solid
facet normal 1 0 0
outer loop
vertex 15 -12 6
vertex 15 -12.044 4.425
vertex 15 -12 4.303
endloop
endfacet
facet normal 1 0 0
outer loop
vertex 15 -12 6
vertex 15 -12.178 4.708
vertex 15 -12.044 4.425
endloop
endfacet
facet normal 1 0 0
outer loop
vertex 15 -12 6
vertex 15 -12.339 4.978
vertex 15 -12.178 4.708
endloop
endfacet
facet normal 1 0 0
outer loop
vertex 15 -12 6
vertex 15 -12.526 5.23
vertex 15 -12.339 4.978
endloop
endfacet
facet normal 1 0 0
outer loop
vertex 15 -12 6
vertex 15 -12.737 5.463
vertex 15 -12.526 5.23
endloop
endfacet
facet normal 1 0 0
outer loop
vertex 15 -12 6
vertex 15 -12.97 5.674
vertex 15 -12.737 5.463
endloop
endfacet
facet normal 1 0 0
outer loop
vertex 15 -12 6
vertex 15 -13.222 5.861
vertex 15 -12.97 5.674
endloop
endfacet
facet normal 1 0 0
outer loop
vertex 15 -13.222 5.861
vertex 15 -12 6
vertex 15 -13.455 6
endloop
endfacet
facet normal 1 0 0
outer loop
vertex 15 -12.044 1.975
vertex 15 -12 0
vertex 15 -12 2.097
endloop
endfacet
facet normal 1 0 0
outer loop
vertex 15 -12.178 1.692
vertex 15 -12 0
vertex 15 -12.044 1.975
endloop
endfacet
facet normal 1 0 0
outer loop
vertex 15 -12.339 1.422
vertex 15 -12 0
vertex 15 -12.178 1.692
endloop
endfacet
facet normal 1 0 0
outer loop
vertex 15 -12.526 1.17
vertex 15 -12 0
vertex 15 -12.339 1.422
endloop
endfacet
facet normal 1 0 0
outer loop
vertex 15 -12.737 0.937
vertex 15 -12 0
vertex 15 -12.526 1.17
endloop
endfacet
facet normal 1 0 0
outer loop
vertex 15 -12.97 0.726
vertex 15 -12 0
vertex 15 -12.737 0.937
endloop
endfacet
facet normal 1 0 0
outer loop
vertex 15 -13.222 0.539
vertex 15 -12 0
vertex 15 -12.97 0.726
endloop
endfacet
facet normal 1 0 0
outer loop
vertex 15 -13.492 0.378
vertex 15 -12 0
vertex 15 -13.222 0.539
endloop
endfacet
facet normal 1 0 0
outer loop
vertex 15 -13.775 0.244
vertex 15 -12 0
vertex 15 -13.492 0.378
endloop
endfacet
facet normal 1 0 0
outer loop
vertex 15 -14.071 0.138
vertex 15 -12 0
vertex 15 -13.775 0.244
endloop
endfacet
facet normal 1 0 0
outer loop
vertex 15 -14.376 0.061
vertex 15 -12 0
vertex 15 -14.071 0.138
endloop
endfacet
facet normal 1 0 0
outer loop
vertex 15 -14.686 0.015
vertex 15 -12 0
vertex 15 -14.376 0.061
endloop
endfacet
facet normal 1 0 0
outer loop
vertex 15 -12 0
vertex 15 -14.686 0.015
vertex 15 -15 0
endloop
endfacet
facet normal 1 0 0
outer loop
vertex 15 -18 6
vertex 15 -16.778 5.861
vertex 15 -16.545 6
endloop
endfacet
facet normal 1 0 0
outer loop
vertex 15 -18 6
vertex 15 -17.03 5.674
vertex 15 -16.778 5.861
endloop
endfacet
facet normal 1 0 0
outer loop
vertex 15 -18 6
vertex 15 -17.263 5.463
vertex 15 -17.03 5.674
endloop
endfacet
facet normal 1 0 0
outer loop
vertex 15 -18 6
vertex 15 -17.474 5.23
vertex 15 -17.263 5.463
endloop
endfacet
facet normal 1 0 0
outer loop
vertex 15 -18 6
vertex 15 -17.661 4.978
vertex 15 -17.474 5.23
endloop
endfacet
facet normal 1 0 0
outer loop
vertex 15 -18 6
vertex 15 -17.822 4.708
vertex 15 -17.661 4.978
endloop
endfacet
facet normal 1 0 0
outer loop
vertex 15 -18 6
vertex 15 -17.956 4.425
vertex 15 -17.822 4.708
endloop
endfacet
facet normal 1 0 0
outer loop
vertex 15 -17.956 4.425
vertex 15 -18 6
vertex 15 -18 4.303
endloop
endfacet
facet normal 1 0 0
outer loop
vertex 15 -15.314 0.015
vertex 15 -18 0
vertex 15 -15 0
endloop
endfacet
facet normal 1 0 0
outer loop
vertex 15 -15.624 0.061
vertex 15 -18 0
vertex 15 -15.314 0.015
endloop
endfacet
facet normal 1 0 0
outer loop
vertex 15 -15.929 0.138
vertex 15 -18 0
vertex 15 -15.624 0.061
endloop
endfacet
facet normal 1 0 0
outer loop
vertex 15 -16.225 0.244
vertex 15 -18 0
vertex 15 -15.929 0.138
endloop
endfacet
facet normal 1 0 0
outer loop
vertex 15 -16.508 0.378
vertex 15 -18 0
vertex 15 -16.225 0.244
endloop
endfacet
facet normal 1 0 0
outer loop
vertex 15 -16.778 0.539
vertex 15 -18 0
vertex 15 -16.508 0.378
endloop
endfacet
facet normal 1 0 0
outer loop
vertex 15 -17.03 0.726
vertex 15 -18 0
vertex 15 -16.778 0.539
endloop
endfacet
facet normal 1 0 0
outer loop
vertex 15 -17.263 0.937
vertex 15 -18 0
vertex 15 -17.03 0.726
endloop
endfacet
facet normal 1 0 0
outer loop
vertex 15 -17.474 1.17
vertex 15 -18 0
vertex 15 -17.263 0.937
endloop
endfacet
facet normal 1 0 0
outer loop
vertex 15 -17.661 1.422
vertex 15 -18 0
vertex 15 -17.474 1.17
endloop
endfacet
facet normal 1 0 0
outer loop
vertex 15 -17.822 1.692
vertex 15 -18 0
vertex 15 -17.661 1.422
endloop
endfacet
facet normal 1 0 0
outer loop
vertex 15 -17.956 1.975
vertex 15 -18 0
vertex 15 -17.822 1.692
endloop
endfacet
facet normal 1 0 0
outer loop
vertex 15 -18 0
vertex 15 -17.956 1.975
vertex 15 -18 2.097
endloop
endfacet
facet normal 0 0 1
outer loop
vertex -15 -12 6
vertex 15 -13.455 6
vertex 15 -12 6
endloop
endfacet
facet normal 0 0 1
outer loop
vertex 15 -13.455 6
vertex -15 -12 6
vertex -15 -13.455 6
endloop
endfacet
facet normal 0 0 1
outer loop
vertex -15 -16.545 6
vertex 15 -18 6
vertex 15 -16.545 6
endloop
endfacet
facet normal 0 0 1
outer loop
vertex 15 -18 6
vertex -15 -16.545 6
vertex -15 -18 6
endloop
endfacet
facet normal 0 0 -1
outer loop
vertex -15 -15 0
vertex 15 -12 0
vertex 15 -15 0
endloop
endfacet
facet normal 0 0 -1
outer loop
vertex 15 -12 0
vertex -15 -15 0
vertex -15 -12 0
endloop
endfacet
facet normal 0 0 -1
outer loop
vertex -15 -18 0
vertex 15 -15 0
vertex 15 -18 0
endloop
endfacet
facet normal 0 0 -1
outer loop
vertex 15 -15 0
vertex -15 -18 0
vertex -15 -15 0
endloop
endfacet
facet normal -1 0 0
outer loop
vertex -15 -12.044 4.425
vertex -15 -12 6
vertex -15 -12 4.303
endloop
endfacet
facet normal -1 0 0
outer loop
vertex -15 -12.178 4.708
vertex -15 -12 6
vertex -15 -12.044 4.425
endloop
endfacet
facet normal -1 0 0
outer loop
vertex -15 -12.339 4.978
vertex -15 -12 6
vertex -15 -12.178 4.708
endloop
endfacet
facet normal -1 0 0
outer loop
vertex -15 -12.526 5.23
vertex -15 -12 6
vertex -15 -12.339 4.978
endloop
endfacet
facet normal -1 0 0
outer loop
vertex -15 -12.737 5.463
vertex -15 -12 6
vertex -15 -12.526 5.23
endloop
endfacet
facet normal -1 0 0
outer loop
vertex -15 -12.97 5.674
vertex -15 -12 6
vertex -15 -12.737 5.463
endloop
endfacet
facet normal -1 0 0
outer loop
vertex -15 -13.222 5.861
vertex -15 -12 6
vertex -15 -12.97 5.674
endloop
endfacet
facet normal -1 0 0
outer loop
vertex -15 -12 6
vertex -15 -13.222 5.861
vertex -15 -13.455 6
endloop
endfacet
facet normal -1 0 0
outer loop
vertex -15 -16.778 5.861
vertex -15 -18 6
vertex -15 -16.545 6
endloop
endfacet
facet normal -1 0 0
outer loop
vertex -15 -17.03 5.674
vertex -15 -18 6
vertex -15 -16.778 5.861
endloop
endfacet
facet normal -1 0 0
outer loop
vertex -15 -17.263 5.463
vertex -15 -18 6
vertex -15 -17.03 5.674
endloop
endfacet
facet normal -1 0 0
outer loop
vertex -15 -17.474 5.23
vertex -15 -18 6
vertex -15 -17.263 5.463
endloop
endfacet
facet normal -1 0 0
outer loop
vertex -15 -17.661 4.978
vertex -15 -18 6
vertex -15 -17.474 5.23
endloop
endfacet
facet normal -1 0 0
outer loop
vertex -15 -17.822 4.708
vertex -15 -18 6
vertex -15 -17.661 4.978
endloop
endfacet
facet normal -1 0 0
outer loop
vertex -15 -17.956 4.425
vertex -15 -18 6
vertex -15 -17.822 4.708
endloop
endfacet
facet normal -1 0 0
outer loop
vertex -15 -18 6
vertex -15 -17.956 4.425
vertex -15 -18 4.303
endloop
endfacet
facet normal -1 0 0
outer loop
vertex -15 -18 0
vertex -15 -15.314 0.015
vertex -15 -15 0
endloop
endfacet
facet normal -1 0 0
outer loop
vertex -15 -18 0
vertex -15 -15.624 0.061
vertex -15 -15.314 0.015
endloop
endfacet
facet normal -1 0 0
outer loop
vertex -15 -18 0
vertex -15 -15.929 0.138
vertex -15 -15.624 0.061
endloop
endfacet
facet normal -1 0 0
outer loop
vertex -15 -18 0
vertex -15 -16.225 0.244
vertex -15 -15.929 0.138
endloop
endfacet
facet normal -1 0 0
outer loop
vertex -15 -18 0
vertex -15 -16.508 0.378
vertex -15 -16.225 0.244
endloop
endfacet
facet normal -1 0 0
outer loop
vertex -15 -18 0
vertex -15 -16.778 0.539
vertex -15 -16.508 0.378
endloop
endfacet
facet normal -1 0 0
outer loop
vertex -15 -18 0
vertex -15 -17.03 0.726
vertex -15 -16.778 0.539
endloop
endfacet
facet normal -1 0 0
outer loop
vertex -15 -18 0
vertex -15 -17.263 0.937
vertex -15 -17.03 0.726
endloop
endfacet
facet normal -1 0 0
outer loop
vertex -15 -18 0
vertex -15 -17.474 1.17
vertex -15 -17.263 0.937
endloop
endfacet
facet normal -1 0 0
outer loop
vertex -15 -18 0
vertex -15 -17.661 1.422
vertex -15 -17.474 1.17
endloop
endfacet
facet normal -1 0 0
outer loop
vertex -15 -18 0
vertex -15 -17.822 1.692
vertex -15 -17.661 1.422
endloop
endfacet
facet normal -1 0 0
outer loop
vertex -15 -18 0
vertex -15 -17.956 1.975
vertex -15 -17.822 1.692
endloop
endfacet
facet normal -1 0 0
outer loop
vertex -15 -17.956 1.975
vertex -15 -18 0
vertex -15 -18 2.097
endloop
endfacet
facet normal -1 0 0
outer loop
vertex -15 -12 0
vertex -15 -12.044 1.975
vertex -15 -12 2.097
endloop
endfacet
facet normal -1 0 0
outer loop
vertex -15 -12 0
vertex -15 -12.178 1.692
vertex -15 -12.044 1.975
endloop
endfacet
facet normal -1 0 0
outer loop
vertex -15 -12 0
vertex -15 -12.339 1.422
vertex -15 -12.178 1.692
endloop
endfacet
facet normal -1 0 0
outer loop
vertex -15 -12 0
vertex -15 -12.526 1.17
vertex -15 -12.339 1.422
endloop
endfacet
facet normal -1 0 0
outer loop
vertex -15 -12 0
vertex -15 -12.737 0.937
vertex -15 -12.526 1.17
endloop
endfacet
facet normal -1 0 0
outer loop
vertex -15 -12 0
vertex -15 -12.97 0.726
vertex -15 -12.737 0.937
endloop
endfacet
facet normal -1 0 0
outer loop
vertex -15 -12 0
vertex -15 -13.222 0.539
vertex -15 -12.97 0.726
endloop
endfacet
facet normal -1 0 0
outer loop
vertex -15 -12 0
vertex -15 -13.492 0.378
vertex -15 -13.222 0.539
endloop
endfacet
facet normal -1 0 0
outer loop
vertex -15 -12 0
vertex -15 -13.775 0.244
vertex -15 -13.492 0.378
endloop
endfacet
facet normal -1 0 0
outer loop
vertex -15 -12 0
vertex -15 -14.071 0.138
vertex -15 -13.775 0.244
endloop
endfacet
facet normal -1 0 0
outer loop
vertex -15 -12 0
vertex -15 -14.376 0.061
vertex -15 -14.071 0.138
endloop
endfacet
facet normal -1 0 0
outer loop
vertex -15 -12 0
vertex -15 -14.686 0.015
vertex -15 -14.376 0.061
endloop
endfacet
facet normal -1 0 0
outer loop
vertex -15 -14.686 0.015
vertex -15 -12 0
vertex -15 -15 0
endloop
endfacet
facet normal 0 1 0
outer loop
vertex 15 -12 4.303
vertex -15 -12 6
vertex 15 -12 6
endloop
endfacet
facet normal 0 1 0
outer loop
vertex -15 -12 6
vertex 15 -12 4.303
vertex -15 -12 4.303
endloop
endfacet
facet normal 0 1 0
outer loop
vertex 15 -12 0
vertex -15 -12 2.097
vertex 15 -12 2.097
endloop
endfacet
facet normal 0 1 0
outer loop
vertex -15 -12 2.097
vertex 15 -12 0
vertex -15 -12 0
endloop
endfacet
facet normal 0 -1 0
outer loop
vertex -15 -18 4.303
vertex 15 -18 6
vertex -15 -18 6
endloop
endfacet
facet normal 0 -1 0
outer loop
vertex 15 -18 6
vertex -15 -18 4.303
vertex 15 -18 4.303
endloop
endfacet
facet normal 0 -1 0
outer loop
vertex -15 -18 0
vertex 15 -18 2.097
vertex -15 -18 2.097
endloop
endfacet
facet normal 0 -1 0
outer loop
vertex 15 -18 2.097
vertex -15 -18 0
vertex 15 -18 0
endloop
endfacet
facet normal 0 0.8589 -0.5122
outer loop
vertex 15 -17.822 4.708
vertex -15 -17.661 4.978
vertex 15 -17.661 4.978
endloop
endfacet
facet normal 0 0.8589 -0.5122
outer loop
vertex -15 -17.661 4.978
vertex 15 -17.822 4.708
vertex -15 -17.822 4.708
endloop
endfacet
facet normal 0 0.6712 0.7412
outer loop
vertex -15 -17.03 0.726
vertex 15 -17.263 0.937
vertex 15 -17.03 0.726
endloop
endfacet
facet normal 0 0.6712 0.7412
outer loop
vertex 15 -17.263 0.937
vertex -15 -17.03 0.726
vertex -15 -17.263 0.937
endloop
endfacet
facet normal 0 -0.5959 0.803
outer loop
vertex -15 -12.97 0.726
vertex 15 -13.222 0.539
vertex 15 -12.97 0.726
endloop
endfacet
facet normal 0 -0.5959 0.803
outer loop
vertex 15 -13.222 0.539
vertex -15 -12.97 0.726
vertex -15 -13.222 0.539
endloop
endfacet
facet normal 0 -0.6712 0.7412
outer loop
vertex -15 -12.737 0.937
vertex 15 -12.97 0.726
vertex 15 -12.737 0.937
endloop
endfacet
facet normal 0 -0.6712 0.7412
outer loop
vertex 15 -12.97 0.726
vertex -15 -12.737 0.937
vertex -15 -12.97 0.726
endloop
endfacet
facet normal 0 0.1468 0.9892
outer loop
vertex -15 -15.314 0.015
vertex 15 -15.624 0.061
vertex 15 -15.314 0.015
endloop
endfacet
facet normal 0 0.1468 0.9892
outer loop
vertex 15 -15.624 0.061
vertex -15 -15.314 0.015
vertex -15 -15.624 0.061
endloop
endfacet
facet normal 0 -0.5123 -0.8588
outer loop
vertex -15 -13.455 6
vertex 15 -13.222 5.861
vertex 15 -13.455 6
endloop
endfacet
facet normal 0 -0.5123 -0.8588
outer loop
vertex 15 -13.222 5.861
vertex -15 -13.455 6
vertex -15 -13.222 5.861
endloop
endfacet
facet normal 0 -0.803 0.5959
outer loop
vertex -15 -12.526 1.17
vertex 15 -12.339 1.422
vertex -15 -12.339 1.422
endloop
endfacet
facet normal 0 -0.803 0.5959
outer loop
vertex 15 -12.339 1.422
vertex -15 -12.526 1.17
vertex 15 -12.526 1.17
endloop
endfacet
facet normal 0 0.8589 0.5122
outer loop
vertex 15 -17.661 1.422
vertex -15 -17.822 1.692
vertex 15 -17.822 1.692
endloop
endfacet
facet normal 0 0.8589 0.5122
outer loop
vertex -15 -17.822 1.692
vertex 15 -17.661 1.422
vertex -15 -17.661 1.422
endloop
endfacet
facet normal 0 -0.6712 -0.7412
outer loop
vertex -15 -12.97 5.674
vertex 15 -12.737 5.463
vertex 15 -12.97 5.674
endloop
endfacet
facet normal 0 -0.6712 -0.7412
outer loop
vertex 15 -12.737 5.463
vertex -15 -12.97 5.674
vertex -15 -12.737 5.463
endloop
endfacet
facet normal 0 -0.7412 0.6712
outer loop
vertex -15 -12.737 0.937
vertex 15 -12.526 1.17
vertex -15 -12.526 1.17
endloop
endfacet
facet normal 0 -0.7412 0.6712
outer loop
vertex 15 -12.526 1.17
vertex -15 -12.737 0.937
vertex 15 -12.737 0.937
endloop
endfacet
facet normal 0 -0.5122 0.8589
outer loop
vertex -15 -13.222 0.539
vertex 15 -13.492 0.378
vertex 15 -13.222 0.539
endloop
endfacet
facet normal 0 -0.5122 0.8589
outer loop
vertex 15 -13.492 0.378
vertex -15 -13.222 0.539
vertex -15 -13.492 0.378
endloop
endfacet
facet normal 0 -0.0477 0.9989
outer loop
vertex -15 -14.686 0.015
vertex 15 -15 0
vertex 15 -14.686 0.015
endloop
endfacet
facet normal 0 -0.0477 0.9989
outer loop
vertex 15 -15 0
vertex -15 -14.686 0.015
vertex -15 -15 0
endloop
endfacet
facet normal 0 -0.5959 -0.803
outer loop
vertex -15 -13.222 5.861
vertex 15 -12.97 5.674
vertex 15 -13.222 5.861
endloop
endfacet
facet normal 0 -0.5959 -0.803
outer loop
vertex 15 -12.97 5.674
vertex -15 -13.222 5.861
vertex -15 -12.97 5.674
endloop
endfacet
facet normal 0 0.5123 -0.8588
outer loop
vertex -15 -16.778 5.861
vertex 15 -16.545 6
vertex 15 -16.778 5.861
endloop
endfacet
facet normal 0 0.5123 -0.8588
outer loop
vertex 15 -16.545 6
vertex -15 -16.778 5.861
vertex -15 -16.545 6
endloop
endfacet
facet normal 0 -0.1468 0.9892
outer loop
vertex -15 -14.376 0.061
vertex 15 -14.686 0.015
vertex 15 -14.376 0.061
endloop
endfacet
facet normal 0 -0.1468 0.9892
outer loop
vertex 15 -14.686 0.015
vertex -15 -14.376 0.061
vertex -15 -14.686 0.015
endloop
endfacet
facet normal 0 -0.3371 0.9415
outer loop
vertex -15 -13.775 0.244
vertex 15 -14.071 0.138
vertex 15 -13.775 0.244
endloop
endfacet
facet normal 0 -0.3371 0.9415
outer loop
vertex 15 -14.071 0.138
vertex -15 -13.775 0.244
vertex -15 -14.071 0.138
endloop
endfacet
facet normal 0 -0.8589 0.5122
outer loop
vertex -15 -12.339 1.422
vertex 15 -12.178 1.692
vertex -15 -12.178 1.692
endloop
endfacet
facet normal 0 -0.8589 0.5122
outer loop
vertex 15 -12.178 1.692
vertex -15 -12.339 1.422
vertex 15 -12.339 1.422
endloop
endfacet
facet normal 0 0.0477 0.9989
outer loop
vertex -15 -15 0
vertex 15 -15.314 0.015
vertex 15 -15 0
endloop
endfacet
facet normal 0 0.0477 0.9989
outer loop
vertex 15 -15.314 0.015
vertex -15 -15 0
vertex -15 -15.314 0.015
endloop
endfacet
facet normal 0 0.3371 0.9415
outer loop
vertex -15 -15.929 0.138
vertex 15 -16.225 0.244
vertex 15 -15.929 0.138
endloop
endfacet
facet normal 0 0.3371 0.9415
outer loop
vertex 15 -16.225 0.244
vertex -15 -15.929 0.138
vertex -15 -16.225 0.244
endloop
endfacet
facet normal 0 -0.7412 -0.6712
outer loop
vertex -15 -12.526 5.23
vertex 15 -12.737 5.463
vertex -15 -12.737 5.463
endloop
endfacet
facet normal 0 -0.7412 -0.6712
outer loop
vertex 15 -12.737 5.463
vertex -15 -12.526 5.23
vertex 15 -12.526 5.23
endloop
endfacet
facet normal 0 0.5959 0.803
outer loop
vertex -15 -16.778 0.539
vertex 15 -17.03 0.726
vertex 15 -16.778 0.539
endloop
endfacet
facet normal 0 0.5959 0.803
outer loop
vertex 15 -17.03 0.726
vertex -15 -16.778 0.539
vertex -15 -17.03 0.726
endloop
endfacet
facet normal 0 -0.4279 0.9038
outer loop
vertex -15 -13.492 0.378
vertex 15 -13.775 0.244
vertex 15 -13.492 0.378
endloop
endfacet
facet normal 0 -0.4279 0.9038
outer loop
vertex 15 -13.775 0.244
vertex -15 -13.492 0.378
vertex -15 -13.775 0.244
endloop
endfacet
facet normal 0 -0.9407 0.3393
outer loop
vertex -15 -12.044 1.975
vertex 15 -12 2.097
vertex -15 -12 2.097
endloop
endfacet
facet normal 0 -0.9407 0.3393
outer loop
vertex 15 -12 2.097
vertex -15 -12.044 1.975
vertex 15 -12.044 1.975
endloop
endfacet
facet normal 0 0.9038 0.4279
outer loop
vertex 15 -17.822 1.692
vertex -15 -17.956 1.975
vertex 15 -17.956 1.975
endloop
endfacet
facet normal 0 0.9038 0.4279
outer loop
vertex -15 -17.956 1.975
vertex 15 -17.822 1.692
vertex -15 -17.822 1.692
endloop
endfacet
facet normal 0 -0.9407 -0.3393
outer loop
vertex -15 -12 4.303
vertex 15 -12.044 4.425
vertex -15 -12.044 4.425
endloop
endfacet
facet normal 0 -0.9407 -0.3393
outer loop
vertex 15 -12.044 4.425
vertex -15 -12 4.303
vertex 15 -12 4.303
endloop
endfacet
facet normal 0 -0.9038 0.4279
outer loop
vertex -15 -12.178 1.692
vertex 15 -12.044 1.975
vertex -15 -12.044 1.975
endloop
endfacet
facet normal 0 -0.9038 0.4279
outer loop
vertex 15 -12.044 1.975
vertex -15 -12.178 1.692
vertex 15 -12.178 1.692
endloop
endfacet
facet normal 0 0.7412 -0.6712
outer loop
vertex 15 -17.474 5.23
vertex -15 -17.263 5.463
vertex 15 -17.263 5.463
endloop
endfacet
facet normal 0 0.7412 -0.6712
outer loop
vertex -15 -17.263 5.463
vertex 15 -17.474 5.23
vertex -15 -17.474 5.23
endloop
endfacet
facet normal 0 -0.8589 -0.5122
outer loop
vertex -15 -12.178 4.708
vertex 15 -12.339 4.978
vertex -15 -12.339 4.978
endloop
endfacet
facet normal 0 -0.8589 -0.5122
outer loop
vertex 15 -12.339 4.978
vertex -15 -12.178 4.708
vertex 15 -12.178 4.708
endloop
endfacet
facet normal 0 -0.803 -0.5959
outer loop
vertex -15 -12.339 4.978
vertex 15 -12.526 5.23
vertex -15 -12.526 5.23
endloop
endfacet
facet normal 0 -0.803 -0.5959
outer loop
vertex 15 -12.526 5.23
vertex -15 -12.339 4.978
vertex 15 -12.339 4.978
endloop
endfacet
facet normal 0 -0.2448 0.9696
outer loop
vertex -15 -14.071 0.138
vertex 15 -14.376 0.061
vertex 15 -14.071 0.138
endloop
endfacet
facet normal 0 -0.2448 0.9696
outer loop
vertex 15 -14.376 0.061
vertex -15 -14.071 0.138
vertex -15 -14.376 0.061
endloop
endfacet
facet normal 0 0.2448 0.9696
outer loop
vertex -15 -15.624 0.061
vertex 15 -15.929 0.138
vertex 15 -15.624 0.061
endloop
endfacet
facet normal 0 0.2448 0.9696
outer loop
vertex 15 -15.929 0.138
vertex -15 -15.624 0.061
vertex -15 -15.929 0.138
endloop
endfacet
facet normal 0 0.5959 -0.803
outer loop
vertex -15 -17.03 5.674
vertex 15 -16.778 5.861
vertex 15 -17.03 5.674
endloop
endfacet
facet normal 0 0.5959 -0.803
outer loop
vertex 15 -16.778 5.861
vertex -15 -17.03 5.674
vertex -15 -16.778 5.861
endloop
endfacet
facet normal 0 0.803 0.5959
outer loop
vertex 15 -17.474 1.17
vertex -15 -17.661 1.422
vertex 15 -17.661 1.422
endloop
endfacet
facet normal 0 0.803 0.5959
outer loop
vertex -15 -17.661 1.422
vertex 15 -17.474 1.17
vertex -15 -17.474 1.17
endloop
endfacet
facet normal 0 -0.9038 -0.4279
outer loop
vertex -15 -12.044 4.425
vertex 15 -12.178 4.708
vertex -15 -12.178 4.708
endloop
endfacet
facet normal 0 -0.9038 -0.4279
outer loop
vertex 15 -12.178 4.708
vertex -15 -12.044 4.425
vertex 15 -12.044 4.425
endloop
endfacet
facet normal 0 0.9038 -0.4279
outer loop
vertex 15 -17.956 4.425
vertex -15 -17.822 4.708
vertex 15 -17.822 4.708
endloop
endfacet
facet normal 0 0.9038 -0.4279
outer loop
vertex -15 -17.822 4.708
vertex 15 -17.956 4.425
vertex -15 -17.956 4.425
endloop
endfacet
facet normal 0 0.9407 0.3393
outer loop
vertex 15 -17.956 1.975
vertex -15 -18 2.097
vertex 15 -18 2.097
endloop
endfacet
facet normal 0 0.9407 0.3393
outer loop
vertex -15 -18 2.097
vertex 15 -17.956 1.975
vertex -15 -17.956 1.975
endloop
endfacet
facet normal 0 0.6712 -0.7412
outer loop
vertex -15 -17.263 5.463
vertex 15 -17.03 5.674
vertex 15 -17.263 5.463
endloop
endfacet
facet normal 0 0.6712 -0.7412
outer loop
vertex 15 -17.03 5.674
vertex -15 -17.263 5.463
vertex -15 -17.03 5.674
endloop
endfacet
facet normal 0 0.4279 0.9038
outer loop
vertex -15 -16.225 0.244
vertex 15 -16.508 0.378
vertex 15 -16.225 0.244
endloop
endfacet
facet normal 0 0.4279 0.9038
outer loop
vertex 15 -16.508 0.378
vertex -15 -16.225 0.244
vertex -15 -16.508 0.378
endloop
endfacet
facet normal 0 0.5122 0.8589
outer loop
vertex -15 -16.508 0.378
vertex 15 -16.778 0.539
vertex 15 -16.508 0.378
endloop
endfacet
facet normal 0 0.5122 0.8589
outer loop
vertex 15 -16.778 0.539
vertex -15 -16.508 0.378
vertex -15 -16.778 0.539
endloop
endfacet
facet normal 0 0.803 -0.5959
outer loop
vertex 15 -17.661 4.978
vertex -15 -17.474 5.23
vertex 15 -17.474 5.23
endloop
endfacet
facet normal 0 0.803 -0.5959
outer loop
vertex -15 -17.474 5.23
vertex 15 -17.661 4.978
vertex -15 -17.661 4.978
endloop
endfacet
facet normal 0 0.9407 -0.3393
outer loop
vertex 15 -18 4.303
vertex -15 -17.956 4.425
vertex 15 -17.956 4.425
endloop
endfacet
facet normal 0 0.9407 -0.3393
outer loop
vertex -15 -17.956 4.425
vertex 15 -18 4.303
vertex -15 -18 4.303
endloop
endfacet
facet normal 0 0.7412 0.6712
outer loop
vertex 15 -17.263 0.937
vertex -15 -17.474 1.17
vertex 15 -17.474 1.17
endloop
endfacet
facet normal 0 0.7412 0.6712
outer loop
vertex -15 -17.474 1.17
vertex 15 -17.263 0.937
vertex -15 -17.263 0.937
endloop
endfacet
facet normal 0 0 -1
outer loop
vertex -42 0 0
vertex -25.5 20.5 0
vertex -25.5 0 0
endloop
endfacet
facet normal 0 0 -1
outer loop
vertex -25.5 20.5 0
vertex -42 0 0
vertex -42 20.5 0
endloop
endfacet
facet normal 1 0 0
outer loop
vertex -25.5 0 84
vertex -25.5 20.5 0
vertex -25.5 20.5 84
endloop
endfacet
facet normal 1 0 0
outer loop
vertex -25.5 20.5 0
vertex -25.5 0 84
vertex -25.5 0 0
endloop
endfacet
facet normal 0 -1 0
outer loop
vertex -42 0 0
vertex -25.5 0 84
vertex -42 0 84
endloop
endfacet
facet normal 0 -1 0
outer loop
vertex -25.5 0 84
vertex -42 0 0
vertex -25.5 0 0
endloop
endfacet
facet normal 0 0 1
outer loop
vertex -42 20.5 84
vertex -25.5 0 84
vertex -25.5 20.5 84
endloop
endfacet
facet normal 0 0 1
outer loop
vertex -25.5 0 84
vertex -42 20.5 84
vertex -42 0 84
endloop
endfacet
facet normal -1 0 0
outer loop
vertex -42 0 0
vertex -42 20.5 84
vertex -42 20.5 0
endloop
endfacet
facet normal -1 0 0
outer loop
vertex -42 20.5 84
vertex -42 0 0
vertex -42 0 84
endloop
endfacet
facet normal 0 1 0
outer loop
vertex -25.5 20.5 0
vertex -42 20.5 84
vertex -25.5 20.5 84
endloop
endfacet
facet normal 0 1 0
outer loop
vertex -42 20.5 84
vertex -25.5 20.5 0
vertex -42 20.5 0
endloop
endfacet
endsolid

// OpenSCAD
// Built by bench/smallmodels/features/compiler.py from a list of features.
$fn = 64;
union() {
    translate([-42, 0, 0]) linear_extrude(height = 84) polygon([[0, 0], [0, 20.5], [16.5, 20.5], [16.5, 0]]);
  }
difference() {
  union() {
    translate([0, -15, 0]) translate([-15, -3, 0]) cube([30, 6, 6]);
  }
  union() {
    translate([-9, -15, 3.2]) rotate([0, 0, 0]) rotate([0, 90, 0]) cylinder(d = 6.4, h = 1024, center = true);
  }
}
